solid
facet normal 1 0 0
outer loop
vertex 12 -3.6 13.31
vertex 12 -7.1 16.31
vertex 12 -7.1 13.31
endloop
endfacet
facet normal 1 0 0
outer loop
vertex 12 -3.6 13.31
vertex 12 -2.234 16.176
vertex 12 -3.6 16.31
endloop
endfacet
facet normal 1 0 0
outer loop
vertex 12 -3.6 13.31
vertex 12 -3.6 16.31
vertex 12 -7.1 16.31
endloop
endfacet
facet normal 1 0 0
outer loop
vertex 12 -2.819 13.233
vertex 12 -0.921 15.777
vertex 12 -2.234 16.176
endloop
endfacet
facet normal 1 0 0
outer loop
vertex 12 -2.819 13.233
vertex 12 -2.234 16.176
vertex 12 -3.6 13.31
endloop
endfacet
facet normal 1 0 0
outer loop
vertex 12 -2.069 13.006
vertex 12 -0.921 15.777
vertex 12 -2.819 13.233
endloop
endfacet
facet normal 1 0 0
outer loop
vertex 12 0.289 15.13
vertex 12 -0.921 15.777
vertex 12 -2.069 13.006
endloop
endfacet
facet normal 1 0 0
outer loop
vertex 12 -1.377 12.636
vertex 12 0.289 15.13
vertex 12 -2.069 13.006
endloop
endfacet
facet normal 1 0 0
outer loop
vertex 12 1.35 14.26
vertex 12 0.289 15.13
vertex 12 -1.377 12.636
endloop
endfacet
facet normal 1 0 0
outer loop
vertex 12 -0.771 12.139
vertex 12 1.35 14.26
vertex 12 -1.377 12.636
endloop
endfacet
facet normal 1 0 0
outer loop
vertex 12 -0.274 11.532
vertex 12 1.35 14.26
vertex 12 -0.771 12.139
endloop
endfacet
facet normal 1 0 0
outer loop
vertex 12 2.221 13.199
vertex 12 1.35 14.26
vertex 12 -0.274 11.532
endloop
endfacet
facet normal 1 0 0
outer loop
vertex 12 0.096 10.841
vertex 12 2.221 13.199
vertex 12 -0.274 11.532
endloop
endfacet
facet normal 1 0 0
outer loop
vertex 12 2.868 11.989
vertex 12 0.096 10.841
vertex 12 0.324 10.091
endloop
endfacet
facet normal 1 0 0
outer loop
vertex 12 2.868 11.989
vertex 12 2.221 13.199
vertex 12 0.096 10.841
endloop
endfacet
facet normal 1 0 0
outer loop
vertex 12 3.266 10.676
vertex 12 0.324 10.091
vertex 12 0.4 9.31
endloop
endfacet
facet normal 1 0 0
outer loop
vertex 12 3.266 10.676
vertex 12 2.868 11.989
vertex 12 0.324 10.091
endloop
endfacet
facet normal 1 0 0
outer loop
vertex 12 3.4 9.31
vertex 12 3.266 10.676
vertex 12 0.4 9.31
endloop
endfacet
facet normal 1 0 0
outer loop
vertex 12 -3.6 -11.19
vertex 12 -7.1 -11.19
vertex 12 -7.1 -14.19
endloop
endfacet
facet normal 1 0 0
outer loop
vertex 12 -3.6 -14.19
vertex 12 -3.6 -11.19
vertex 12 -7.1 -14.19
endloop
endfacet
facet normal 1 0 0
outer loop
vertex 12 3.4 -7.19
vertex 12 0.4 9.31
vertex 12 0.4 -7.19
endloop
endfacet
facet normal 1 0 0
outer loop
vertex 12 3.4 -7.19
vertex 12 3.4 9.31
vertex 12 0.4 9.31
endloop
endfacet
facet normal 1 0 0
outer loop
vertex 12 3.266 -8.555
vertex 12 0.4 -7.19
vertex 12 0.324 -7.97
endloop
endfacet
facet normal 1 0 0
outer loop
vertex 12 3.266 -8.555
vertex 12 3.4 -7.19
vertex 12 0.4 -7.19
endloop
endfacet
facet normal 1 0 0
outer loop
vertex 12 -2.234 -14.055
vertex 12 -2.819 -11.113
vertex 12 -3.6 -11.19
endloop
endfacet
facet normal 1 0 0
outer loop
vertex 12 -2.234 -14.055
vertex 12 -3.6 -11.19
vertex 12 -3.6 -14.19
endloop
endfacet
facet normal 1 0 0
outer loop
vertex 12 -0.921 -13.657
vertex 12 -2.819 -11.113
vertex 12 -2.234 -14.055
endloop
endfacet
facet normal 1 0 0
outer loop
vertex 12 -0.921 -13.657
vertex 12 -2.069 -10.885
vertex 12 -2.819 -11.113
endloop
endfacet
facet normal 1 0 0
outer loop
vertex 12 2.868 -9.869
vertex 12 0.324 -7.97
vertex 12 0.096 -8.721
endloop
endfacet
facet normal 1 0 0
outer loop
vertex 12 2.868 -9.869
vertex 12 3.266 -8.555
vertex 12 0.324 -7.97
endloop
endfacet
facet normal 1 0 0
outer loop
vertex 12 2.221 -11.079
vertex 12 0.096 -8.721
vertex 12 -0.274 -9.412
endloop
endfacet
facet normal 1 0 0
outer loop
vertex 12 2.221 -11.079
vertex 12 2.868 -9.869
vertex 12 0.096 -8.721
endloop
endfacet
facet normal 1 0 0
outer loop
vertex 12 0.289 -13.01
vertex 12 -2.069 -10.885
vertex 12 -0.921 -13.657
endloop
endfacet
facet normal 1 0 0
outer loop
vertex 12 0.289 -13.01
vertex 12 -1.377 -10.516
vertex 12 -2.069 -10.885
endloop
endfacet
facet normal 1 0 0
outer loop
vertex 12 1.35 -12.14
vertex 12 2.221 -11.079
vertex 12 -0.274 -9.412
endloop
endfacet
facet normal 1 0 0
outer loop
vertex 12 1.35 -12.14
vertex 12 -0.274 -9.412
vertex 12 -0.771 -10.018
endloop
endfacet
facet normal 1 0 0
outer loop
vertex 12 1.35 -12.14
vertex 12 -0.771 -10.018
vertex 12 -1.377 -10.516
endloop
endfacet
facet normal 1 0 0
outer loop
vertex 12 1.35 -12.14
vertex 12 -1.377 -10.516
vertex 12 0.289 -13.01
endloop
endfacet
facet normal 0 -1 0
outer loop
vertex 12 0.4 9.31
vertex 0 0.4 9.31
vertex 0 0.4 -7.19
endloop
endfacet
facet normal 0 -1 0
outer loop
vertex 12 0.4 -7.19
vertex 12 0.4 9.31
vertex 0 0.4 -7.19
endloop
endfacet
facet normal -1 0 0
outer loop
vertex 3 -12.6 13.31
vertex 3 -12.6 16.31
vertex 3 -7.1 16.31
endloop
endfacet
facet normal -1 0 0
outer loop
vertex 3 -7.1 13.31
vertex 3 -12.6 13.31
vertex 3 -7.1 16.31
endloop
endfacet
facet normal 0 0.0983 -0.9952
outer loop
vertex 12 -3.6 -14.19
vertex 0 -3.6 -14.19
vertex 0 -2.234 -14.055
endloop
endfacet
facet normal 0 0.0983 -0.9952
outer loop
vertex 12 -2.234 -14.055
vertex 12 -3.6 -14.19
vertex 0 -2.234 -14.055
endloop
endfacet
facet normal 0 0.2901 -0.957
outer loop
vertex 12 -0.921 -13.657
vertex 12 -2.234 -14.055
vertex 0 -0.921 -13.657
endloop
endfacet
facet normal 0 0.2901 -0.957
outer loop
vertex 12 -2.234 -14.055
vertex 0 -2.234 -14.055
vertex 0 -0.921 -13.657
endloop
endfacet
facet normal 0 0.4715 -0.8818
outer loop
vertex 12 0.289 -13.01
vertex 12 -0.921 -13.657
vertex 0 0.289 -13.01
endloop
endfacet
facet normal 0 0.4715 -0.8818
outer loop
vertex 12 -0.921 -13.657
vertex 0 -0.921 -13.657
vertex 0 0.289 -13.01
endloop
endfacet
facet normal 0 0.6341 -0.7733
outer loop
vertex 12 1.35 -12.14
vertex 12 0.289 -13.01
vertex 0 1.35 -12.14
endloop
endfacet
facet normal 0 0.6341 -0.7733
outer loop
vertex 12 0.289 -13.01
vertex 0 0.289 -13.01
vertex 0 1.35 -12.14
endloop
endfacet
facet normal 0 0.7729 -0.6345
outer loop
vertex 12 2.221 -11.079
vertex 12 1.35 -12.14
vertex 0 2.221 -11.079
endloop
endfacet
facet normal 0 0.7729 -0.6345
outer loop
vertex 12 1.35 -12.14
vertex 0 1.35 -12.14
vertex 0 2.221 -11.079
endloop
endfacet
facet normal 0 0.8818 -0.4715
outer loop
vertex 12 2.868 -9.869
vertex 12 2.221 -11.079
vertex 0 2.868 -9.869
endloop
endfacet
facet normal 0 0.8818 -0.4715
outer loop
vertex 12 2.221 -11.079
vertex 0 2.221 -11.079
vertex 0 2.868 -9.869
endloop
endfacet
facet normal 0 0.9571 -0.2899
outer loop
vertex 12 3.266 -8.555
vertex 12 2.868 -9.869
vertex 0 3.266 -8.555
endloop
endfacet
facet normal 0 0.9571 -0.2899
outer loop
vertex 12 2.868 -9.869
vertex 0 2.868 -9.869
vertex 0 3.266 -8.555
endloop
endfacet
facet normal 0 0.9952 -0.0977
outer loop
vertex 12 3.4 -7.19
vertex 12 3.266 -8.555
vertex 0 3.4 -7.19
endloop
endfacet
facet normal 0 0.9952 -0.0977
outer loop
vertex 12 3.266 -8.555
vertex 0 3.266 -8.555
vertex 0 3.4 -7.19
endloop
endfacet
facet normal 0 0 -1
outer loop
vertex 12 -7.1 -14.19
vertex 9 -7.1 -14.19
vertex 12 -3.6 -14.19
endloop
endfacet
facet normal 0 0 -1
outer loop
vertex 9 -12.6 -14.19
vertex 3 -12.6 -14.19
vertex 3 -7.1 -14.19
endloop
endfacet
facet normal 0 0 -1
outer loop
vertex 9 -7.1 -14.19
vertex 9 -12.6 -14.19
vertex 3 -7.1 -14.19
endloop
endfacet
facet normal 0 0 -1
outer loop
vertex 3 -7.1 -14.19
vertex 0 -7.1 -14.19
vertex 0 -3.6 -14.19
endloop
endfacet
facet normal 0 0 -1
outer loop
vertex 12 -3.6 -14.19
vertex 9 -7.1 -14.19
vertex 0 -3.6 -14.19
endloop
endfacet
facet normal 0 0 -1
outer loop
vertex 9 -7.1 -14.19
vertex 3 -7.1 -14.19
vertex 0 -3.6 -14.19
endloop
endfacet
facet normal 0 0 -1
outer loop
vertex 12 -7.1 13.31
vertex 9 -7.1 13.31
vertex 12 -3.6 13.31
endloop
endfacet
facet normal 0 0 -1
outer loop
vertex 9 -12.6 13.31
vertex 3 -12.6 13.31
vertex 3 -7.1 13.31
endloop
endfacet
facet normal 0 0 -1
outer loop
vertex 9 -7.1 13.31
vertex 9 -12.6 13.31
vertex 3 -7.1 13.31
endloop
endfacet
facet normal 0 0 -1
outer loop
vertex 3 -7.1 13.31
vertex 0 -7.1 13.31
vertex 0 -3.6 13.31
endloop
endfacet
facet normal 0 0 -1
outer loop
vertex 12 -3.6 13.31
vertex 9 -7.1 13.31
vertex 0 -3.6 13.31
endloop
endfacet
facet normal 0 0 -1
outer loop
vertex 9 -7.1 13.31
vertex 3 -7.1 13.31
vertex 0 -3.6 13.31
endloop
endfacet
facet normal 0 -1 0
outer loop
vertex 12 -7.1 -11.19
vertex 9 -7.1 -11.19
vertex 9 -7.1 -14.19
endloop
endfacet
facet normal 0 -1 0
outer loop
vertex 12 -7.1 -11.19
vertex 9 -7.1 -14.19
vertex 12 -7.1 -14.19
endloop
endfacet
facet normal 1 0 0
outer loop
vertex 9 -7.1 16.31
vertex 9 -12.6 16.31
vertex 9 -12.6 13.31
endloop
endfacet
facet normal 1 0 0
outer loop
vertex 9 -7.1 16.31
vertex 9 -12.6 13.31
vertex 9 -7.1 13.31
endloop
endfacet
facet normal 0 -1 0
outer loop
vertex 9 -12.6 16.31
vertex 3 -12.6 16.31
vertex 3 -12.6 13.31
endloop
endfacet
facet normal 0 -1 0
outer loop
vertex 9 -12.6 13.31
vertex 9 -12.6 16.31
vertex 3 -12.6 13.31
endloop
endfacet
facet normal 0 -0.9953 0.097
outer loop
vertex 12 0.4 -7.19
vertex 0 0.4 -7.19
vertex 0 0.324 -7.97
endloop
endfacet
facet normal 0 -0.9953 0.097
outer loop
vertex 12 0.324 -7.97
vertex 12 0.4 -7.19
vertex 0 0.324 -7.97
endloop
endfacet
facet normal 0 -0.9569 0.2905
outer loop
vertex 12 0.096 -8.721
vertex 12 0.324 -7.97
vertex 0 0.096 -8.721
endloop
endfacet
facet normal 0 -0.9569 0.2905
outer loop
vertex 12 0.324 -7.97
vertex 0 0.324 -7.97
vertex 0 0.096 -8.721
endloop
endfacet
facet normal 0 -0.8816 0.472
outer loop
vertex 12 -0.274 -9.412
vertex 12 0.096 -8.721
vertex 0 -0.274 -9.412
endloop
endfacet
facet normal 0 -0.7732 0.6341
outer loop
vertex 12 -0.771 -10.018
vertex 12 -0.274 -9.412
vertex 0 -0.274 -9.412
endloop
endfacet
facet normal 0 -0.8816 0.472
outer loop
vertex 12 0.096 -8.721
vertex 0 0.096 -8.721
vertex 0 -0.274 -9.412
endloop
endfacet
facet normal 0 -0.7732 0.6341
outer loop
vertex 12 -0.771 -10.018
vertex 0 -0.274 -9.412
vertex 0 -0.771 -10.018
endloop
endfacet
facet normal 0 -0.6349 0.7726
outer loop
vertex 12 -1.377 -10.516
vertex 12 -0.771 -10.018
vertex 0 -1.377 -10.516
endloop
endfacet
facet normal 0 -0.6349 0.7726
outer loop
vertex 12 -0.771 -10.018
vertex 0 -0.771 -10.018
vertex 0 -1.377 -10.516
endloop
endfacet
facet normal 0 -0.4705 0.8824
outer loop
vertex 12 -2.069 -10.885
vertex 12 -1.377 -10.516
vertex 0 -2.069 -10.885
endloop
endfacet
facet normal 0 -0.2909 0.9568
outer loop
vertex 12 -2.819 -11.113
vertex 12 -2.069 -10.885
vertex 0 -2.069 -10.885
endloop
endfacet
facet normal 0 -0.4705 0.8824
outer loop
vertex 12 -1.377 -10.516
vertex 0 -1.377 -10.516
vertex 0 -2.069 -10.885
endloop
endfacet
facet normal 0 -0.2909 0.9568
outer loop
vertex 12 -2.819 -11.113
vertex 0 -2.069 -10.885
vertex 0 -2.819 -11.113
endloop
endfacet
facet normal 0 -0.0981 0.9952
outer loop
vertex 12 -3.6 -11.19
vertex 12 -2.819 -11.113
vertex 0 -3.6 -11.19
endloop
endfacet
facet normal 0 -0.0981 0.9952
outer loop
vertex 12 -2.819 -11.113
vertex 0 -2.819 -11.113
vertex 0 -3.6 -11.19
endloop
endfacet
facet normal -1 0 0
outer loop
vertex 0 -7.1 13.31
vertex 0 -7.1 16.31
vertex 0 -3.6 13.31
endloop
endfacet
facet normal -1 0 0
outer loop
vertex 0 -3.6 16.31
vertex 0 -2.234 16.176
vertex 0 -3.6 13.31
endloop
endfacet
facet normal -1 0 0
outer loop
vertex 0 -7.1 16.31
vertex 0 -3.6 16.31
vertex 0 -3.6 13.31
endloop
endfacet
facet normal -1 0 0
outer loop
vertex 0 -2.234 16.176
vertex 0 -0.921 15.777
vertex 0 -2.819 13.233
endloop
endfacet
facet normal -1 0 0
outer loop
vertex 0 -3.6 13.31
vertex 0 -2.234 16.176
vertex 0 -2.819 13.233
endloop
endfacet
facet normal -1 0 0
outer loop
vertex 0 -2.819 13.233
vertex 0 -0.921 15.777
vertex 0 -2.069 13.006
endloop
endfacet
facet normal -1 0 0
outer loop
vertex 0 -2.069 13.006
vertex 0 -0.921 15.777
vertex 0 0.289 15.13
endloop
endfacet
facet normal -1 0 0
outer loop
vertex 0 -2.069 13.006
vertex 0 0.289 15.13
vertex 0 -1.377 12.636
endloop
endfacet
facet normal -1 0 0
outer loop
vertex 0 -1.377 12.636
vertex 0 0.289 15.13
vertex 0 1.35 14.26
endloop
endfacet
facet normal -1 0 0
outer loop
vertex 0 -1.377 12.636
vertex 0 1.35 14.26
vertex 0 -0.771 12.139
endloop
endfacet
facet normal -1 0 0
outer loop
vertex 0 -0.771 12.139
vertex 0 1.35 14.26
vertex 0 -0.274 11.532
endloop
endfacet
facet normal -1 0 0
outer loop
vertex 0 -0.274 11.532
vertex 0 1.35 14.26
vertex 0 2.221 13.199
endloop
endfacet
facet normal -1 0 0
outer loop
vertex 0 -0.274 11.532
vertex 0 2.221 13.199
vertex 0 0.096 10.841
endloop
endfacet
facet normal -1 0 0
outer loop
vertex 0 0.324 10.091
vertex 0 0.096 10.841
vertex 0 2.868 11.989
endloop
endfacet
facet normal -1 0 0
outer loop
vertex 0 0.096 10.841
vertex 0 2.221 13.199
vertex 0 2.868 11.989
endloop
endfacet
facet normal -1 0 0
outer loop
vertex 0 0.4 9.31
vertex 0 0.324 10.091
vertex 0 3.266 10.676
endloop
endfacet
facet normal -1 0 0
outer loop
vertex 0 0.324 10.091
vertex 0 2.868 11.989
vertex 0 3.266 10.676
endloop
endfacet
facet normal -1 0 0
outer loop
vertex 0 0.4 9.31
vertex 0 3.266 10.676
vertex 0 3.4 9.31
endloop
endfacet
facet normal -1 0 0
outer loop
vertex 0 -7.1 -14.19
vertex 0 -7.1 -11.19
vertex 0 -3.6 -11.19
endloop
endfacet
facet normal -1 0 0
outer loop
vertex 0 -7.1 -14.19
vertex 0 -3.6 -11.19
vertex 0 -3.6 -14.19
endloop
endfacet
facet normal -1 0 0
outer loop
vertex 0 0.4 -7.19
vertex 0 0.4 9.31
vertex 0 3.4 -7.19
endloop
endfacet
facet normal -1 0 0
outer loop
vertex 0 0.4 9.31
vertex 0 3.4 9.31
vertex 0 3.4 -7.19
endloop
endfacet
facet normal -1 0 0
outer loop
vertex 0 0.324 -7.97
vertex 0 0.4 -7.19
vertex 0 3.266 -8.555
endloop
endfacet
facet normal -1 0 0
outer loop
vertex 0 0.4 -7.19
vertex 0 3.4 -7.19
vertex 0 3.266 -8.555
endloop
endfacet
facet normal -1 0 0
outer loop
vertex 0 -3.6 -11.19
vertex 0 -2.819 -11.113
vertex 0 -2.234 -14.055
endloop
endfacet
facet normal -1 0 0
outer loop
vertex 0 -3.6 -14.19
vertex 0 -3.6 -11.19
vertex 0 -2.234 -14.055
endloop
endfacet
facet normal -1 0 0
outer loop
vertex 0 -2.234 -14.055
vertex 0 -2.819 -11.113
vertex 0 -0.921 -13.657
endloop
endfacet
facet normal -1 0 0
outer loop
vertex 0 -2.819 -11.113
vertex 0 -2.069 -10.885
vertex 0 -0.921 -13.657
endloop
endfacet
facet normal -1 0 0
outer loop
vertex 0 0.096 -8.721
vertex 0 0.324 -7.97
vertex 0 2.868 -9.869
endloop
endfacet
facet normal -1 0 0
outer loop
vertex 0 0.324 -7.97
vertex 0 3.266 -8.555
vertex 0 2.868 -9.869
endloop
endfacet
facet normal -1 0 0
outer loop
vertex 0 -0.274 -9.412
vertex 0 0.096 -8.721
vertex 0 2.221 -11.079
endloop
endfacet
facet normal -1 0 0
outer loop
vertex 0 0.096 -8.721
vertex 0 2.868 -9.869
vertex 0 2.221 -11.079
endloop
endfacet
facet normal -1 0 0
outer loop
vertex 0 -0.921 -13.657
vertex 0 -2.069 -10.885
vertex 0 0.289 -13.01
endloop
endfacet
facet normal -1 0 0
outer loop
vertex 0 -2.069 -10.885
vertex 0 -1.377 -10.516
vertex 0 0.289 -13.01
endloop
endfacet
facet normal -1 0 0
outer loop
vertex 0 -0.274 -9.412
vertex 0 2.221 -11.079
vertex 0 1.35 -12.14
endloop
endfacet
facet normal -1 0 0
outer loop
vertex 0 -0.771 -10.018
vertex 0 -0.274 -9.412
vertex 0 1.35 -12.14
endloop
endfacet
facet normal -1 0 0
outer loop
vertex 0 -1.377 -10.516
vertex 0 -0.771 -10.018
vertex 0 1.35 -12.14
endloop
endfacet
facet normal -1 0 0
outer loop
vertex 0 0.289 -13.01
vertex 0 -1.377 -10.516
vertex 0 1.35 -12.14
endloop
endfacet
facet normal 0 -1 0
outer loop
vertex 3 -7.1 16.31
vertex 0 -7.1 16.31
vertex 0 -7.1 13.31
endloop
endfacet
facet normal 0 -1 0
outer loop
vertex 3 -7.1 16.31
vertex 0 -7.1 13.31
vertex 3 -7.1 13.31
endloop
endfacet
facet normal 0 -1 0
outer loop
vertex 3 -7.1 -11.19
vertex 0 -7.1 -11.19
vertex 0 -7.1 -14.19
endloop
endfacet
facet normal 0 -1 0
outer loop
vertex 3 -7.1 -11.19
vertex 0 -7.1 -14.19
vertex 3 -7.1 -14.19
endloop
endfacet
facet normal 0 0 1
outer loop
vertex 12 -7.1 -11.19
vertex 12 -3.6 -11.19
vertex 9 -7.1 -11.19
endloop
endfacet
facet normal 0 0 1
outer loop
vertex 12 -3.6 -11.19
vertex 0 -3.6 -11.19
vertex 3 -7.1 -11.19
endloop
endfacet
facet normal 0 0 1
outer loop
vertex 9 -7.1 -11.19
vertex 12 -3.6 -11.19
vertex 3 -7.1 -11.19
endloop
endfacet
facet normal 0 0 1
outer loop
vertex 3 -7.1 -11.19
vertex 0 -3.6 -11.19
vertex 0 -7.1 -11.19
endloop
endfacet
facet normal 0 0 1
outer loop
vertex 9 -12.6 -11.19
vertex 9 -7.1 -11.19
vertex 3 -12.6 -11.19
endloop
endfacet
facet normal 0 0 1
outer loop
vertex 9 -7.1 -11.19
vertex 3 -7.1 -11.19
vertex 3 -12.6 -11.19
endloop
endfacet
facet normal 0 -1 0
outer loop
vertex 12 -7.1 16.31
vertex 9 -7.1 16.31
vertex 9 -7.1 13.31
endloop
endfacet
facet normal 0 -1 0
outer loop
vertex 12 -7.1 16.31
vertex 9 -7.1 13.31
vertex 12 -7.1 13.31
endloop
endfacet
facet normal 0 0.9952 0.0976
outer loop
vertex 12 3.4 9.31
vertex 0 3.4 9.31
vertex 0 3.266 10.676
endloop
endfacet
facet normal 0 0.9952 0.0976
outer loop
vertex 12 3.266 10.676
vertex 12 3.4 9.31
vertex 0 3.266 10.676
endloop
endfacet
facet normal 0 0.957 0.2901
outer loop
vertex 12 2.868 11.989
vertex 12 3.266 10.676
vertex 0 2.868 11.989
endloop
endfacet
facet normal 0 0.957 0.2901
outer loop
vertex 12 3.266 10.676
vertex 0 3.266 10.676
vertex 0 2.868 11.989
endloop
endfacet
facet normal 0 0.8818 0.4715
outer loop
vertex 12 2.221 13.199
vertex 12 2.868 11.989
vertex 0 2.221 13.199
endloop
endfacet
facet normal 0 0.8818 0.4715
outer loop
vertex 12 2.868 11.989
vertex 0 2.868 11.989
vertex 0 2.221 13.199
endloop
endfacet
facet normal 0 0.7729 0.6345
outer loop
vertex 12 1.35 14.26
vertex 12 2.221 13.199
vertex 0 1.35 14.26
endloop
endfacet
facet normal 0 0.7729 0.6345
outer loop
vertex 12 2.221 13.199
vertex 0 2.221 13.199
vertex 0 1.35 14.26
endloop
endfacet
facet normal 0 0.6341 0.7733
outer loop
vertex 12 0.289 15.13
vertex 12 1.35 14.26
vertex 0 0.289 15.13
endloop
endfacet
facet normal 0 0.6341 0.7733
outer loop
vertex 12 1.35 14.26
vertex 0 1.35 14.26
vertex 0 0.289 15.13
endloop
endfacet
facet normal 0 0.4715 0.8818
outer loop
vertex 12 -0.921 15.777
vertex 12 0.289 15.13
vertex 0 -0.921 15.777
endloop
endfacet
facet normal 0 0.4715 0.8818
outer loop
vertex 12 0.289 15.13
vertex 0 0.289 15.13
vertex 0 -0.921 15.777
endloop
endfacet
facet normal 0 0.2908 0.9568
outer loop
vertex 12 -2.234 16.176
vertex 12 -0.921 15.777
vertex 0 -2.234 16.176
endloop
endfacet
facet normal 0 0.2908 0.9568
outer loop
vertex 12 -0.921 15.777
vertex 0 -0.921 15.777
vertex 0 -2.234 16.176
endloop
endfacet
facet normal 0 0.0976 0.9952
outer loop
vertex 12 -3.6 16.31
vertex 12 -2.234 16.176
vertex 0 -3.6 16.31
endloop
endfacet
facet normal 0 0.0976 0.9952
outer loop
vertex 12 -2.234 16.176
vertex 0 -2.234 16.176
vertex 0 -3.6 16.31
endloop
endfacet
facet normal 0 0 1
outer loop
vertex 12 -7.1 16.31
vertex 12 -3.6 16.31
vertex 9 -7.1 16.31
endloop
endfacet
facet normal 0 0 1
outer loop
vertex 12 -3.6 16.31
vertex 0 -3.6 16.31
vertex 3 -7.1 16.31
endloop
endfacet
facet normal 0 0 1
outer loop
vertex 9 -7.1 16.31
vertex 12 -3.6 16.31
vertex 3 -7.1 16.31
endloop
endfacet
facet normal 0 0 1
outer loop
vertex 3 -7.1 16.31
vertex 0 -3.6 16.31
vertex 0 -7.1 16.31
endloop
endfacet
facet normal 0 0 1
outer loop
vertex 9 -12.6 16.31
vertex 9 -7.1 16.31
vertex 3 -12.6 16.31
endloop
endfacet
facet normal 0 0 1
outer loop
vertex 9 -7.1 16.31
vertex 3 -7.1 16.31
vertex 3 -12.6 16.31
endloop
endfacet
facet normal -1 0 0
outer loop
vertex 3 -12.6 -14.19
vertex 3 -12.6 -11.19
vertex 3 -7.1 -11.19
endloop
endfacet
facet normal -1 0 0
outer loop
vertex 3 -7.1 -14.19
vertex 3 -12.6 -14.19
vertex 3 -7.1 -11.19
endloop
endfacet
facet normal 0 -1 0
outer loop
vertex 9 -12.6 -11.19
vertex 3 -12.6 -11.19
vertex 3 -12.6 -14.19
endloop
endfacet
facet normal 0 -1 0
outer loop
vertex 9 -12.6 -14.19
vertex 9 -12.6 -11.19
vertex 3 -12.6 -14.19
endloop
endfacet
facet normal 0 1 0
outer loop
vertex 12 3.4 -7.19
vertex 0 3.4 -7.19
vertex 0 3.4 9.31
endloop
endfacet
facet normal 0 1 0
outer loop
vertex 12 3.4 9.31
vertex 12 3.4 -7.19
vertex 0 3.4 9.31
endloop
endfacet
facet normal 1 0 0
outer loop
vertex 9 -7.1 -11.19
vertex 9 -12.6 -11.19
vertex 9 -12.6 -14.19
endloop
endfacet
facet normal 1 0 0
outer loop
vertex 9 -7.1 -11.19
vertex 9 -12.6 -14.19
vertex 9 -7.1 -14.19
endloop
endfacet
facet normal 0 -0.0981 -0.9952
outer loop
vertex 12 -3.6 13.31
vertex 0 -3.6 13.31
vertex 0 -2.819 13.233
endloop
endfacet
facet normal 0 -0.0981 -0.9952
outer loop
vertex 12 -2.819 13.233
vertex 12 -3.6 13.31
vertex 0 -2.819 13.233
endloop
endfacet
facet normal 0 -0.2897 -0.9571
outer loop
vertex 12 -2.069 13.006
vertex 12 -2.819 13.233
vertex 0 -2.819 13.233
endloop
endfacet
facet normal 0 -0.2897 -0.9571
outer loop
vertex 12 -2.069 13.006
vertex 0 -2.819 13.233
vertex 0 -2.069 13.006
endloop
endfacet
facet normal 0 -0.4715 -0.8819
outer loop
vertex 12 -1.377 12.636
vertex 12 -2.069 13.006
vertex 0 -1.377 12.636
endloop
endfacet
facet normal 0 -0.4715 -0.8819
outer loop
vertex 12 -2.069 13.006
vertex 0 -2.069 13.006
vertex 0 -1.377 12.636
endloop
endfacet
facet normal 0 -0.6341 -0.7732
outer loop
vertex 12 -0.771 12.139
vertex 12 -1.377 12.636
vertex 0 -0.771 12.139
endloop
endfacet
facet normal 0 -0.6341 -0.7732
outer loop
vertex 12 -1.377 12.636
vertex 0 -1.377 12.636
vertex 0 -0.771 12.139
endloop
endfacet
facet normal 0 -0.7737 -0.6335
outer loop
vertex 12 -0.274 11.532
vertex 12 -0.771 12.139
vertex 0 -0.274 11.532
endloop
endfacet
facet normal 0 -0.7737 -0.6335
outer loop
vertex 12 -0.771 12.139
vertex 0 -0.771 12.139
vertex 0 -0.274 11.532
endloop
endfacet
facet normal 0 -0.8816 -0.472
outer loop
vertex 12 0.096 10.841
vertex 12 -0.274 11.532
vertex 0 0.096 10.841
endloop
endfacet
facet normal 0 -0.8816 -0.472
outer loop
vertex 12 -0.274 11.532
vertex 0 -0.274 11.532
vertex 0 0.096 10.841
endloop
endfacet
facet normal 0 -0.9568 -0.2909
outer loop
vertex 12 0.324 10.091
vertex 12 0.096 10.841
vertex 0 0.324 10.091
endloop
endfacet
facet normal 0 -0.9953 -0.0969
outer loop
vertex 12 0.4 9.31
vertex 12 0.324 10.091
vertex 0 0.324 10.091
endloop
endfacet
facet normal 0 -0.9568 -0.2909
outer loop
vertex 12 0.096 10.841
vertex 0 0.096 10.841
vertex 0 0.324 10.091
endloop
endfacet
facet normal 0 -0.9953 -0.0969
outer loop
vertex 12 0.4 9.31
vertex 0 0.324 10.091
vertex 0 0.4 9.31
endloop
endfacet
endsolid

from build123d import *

# Parameters (mm, degrees)
BOSS_EXTRUDE1_DEPTH = 12
SKETCH5_W           = 3
SKETCH5_H           = 5.5
CUT_EXTRUDE1_DEPTH  = 52


with BuildPart() as part:
    # Sketch4 → Boss-Extrude1 (new body)
    with BuildSketch(Plane(origin=(0, 0, 0), x_dir=(0, 0, -1), z_dir=(1, 0, 0))):
        with BuildLine():
            Line((-13.310160428, -12.59959893), (-13.310160428, -3.59959893))
            ThreePointArc((-13.310160428, -3.59959893), (-12.138587553, -0.771171806), (-9.310160428, 0.40040107))
            Line((-9.310160428, 0.40040107), (7.189839572, 0.40040107))
            ThreePointArc((7.189839572, 0.40040107), (10.018266697, -0.771171806), (11.189839572, -3.59959893))
            Line((11.189839572, -3.59959893), (11.189839572, -12.59959893))
            Line((11.189839572, -12.59959893), (14.189839572, -12.59959893))
            Line((14.189839572, -12.59959893), (14.189839572, -3.59959893))
            ThreePointArc((14.189839572, -3.59959893), (12.13958704, 1.350148538), (7.189839572, 3.40040107))
            Line((7.189839572, 3.40040107), (-9.310160428, 3.40040107))
            ThreePointArc((-9.310160428, 3.40040107), (-14.259907896, 1.350148538), (-16.310160428, -3.59959893))
            Line((-16.310160428, -3.59959893), (-16.310160428, -12.59959893))
            Line((-16.310160428, -12.59959893), (-13.310160428, -12.59959893))
        make_face()
    extrude(amount=BOSS_EXTRUDE1_DEPTH)

    # Sketch5 → Cut-Extrude1 (cut)
    with BuildSketch(Plane.XY.offset(16.310160428)):
        with Locations((1.5, -9.84959893)):
            Rectangle(SKETCH5_W, SKETCH5_H)
        with Locations((10.5, -9.84959893)):
            Rectangle(SKETCH5_W, SKETCH5_H)
    extrude(amount=-CUT_EXTRUDE1_DEPTH, mode=Mode.SUBTRACT)


solid = part.part
